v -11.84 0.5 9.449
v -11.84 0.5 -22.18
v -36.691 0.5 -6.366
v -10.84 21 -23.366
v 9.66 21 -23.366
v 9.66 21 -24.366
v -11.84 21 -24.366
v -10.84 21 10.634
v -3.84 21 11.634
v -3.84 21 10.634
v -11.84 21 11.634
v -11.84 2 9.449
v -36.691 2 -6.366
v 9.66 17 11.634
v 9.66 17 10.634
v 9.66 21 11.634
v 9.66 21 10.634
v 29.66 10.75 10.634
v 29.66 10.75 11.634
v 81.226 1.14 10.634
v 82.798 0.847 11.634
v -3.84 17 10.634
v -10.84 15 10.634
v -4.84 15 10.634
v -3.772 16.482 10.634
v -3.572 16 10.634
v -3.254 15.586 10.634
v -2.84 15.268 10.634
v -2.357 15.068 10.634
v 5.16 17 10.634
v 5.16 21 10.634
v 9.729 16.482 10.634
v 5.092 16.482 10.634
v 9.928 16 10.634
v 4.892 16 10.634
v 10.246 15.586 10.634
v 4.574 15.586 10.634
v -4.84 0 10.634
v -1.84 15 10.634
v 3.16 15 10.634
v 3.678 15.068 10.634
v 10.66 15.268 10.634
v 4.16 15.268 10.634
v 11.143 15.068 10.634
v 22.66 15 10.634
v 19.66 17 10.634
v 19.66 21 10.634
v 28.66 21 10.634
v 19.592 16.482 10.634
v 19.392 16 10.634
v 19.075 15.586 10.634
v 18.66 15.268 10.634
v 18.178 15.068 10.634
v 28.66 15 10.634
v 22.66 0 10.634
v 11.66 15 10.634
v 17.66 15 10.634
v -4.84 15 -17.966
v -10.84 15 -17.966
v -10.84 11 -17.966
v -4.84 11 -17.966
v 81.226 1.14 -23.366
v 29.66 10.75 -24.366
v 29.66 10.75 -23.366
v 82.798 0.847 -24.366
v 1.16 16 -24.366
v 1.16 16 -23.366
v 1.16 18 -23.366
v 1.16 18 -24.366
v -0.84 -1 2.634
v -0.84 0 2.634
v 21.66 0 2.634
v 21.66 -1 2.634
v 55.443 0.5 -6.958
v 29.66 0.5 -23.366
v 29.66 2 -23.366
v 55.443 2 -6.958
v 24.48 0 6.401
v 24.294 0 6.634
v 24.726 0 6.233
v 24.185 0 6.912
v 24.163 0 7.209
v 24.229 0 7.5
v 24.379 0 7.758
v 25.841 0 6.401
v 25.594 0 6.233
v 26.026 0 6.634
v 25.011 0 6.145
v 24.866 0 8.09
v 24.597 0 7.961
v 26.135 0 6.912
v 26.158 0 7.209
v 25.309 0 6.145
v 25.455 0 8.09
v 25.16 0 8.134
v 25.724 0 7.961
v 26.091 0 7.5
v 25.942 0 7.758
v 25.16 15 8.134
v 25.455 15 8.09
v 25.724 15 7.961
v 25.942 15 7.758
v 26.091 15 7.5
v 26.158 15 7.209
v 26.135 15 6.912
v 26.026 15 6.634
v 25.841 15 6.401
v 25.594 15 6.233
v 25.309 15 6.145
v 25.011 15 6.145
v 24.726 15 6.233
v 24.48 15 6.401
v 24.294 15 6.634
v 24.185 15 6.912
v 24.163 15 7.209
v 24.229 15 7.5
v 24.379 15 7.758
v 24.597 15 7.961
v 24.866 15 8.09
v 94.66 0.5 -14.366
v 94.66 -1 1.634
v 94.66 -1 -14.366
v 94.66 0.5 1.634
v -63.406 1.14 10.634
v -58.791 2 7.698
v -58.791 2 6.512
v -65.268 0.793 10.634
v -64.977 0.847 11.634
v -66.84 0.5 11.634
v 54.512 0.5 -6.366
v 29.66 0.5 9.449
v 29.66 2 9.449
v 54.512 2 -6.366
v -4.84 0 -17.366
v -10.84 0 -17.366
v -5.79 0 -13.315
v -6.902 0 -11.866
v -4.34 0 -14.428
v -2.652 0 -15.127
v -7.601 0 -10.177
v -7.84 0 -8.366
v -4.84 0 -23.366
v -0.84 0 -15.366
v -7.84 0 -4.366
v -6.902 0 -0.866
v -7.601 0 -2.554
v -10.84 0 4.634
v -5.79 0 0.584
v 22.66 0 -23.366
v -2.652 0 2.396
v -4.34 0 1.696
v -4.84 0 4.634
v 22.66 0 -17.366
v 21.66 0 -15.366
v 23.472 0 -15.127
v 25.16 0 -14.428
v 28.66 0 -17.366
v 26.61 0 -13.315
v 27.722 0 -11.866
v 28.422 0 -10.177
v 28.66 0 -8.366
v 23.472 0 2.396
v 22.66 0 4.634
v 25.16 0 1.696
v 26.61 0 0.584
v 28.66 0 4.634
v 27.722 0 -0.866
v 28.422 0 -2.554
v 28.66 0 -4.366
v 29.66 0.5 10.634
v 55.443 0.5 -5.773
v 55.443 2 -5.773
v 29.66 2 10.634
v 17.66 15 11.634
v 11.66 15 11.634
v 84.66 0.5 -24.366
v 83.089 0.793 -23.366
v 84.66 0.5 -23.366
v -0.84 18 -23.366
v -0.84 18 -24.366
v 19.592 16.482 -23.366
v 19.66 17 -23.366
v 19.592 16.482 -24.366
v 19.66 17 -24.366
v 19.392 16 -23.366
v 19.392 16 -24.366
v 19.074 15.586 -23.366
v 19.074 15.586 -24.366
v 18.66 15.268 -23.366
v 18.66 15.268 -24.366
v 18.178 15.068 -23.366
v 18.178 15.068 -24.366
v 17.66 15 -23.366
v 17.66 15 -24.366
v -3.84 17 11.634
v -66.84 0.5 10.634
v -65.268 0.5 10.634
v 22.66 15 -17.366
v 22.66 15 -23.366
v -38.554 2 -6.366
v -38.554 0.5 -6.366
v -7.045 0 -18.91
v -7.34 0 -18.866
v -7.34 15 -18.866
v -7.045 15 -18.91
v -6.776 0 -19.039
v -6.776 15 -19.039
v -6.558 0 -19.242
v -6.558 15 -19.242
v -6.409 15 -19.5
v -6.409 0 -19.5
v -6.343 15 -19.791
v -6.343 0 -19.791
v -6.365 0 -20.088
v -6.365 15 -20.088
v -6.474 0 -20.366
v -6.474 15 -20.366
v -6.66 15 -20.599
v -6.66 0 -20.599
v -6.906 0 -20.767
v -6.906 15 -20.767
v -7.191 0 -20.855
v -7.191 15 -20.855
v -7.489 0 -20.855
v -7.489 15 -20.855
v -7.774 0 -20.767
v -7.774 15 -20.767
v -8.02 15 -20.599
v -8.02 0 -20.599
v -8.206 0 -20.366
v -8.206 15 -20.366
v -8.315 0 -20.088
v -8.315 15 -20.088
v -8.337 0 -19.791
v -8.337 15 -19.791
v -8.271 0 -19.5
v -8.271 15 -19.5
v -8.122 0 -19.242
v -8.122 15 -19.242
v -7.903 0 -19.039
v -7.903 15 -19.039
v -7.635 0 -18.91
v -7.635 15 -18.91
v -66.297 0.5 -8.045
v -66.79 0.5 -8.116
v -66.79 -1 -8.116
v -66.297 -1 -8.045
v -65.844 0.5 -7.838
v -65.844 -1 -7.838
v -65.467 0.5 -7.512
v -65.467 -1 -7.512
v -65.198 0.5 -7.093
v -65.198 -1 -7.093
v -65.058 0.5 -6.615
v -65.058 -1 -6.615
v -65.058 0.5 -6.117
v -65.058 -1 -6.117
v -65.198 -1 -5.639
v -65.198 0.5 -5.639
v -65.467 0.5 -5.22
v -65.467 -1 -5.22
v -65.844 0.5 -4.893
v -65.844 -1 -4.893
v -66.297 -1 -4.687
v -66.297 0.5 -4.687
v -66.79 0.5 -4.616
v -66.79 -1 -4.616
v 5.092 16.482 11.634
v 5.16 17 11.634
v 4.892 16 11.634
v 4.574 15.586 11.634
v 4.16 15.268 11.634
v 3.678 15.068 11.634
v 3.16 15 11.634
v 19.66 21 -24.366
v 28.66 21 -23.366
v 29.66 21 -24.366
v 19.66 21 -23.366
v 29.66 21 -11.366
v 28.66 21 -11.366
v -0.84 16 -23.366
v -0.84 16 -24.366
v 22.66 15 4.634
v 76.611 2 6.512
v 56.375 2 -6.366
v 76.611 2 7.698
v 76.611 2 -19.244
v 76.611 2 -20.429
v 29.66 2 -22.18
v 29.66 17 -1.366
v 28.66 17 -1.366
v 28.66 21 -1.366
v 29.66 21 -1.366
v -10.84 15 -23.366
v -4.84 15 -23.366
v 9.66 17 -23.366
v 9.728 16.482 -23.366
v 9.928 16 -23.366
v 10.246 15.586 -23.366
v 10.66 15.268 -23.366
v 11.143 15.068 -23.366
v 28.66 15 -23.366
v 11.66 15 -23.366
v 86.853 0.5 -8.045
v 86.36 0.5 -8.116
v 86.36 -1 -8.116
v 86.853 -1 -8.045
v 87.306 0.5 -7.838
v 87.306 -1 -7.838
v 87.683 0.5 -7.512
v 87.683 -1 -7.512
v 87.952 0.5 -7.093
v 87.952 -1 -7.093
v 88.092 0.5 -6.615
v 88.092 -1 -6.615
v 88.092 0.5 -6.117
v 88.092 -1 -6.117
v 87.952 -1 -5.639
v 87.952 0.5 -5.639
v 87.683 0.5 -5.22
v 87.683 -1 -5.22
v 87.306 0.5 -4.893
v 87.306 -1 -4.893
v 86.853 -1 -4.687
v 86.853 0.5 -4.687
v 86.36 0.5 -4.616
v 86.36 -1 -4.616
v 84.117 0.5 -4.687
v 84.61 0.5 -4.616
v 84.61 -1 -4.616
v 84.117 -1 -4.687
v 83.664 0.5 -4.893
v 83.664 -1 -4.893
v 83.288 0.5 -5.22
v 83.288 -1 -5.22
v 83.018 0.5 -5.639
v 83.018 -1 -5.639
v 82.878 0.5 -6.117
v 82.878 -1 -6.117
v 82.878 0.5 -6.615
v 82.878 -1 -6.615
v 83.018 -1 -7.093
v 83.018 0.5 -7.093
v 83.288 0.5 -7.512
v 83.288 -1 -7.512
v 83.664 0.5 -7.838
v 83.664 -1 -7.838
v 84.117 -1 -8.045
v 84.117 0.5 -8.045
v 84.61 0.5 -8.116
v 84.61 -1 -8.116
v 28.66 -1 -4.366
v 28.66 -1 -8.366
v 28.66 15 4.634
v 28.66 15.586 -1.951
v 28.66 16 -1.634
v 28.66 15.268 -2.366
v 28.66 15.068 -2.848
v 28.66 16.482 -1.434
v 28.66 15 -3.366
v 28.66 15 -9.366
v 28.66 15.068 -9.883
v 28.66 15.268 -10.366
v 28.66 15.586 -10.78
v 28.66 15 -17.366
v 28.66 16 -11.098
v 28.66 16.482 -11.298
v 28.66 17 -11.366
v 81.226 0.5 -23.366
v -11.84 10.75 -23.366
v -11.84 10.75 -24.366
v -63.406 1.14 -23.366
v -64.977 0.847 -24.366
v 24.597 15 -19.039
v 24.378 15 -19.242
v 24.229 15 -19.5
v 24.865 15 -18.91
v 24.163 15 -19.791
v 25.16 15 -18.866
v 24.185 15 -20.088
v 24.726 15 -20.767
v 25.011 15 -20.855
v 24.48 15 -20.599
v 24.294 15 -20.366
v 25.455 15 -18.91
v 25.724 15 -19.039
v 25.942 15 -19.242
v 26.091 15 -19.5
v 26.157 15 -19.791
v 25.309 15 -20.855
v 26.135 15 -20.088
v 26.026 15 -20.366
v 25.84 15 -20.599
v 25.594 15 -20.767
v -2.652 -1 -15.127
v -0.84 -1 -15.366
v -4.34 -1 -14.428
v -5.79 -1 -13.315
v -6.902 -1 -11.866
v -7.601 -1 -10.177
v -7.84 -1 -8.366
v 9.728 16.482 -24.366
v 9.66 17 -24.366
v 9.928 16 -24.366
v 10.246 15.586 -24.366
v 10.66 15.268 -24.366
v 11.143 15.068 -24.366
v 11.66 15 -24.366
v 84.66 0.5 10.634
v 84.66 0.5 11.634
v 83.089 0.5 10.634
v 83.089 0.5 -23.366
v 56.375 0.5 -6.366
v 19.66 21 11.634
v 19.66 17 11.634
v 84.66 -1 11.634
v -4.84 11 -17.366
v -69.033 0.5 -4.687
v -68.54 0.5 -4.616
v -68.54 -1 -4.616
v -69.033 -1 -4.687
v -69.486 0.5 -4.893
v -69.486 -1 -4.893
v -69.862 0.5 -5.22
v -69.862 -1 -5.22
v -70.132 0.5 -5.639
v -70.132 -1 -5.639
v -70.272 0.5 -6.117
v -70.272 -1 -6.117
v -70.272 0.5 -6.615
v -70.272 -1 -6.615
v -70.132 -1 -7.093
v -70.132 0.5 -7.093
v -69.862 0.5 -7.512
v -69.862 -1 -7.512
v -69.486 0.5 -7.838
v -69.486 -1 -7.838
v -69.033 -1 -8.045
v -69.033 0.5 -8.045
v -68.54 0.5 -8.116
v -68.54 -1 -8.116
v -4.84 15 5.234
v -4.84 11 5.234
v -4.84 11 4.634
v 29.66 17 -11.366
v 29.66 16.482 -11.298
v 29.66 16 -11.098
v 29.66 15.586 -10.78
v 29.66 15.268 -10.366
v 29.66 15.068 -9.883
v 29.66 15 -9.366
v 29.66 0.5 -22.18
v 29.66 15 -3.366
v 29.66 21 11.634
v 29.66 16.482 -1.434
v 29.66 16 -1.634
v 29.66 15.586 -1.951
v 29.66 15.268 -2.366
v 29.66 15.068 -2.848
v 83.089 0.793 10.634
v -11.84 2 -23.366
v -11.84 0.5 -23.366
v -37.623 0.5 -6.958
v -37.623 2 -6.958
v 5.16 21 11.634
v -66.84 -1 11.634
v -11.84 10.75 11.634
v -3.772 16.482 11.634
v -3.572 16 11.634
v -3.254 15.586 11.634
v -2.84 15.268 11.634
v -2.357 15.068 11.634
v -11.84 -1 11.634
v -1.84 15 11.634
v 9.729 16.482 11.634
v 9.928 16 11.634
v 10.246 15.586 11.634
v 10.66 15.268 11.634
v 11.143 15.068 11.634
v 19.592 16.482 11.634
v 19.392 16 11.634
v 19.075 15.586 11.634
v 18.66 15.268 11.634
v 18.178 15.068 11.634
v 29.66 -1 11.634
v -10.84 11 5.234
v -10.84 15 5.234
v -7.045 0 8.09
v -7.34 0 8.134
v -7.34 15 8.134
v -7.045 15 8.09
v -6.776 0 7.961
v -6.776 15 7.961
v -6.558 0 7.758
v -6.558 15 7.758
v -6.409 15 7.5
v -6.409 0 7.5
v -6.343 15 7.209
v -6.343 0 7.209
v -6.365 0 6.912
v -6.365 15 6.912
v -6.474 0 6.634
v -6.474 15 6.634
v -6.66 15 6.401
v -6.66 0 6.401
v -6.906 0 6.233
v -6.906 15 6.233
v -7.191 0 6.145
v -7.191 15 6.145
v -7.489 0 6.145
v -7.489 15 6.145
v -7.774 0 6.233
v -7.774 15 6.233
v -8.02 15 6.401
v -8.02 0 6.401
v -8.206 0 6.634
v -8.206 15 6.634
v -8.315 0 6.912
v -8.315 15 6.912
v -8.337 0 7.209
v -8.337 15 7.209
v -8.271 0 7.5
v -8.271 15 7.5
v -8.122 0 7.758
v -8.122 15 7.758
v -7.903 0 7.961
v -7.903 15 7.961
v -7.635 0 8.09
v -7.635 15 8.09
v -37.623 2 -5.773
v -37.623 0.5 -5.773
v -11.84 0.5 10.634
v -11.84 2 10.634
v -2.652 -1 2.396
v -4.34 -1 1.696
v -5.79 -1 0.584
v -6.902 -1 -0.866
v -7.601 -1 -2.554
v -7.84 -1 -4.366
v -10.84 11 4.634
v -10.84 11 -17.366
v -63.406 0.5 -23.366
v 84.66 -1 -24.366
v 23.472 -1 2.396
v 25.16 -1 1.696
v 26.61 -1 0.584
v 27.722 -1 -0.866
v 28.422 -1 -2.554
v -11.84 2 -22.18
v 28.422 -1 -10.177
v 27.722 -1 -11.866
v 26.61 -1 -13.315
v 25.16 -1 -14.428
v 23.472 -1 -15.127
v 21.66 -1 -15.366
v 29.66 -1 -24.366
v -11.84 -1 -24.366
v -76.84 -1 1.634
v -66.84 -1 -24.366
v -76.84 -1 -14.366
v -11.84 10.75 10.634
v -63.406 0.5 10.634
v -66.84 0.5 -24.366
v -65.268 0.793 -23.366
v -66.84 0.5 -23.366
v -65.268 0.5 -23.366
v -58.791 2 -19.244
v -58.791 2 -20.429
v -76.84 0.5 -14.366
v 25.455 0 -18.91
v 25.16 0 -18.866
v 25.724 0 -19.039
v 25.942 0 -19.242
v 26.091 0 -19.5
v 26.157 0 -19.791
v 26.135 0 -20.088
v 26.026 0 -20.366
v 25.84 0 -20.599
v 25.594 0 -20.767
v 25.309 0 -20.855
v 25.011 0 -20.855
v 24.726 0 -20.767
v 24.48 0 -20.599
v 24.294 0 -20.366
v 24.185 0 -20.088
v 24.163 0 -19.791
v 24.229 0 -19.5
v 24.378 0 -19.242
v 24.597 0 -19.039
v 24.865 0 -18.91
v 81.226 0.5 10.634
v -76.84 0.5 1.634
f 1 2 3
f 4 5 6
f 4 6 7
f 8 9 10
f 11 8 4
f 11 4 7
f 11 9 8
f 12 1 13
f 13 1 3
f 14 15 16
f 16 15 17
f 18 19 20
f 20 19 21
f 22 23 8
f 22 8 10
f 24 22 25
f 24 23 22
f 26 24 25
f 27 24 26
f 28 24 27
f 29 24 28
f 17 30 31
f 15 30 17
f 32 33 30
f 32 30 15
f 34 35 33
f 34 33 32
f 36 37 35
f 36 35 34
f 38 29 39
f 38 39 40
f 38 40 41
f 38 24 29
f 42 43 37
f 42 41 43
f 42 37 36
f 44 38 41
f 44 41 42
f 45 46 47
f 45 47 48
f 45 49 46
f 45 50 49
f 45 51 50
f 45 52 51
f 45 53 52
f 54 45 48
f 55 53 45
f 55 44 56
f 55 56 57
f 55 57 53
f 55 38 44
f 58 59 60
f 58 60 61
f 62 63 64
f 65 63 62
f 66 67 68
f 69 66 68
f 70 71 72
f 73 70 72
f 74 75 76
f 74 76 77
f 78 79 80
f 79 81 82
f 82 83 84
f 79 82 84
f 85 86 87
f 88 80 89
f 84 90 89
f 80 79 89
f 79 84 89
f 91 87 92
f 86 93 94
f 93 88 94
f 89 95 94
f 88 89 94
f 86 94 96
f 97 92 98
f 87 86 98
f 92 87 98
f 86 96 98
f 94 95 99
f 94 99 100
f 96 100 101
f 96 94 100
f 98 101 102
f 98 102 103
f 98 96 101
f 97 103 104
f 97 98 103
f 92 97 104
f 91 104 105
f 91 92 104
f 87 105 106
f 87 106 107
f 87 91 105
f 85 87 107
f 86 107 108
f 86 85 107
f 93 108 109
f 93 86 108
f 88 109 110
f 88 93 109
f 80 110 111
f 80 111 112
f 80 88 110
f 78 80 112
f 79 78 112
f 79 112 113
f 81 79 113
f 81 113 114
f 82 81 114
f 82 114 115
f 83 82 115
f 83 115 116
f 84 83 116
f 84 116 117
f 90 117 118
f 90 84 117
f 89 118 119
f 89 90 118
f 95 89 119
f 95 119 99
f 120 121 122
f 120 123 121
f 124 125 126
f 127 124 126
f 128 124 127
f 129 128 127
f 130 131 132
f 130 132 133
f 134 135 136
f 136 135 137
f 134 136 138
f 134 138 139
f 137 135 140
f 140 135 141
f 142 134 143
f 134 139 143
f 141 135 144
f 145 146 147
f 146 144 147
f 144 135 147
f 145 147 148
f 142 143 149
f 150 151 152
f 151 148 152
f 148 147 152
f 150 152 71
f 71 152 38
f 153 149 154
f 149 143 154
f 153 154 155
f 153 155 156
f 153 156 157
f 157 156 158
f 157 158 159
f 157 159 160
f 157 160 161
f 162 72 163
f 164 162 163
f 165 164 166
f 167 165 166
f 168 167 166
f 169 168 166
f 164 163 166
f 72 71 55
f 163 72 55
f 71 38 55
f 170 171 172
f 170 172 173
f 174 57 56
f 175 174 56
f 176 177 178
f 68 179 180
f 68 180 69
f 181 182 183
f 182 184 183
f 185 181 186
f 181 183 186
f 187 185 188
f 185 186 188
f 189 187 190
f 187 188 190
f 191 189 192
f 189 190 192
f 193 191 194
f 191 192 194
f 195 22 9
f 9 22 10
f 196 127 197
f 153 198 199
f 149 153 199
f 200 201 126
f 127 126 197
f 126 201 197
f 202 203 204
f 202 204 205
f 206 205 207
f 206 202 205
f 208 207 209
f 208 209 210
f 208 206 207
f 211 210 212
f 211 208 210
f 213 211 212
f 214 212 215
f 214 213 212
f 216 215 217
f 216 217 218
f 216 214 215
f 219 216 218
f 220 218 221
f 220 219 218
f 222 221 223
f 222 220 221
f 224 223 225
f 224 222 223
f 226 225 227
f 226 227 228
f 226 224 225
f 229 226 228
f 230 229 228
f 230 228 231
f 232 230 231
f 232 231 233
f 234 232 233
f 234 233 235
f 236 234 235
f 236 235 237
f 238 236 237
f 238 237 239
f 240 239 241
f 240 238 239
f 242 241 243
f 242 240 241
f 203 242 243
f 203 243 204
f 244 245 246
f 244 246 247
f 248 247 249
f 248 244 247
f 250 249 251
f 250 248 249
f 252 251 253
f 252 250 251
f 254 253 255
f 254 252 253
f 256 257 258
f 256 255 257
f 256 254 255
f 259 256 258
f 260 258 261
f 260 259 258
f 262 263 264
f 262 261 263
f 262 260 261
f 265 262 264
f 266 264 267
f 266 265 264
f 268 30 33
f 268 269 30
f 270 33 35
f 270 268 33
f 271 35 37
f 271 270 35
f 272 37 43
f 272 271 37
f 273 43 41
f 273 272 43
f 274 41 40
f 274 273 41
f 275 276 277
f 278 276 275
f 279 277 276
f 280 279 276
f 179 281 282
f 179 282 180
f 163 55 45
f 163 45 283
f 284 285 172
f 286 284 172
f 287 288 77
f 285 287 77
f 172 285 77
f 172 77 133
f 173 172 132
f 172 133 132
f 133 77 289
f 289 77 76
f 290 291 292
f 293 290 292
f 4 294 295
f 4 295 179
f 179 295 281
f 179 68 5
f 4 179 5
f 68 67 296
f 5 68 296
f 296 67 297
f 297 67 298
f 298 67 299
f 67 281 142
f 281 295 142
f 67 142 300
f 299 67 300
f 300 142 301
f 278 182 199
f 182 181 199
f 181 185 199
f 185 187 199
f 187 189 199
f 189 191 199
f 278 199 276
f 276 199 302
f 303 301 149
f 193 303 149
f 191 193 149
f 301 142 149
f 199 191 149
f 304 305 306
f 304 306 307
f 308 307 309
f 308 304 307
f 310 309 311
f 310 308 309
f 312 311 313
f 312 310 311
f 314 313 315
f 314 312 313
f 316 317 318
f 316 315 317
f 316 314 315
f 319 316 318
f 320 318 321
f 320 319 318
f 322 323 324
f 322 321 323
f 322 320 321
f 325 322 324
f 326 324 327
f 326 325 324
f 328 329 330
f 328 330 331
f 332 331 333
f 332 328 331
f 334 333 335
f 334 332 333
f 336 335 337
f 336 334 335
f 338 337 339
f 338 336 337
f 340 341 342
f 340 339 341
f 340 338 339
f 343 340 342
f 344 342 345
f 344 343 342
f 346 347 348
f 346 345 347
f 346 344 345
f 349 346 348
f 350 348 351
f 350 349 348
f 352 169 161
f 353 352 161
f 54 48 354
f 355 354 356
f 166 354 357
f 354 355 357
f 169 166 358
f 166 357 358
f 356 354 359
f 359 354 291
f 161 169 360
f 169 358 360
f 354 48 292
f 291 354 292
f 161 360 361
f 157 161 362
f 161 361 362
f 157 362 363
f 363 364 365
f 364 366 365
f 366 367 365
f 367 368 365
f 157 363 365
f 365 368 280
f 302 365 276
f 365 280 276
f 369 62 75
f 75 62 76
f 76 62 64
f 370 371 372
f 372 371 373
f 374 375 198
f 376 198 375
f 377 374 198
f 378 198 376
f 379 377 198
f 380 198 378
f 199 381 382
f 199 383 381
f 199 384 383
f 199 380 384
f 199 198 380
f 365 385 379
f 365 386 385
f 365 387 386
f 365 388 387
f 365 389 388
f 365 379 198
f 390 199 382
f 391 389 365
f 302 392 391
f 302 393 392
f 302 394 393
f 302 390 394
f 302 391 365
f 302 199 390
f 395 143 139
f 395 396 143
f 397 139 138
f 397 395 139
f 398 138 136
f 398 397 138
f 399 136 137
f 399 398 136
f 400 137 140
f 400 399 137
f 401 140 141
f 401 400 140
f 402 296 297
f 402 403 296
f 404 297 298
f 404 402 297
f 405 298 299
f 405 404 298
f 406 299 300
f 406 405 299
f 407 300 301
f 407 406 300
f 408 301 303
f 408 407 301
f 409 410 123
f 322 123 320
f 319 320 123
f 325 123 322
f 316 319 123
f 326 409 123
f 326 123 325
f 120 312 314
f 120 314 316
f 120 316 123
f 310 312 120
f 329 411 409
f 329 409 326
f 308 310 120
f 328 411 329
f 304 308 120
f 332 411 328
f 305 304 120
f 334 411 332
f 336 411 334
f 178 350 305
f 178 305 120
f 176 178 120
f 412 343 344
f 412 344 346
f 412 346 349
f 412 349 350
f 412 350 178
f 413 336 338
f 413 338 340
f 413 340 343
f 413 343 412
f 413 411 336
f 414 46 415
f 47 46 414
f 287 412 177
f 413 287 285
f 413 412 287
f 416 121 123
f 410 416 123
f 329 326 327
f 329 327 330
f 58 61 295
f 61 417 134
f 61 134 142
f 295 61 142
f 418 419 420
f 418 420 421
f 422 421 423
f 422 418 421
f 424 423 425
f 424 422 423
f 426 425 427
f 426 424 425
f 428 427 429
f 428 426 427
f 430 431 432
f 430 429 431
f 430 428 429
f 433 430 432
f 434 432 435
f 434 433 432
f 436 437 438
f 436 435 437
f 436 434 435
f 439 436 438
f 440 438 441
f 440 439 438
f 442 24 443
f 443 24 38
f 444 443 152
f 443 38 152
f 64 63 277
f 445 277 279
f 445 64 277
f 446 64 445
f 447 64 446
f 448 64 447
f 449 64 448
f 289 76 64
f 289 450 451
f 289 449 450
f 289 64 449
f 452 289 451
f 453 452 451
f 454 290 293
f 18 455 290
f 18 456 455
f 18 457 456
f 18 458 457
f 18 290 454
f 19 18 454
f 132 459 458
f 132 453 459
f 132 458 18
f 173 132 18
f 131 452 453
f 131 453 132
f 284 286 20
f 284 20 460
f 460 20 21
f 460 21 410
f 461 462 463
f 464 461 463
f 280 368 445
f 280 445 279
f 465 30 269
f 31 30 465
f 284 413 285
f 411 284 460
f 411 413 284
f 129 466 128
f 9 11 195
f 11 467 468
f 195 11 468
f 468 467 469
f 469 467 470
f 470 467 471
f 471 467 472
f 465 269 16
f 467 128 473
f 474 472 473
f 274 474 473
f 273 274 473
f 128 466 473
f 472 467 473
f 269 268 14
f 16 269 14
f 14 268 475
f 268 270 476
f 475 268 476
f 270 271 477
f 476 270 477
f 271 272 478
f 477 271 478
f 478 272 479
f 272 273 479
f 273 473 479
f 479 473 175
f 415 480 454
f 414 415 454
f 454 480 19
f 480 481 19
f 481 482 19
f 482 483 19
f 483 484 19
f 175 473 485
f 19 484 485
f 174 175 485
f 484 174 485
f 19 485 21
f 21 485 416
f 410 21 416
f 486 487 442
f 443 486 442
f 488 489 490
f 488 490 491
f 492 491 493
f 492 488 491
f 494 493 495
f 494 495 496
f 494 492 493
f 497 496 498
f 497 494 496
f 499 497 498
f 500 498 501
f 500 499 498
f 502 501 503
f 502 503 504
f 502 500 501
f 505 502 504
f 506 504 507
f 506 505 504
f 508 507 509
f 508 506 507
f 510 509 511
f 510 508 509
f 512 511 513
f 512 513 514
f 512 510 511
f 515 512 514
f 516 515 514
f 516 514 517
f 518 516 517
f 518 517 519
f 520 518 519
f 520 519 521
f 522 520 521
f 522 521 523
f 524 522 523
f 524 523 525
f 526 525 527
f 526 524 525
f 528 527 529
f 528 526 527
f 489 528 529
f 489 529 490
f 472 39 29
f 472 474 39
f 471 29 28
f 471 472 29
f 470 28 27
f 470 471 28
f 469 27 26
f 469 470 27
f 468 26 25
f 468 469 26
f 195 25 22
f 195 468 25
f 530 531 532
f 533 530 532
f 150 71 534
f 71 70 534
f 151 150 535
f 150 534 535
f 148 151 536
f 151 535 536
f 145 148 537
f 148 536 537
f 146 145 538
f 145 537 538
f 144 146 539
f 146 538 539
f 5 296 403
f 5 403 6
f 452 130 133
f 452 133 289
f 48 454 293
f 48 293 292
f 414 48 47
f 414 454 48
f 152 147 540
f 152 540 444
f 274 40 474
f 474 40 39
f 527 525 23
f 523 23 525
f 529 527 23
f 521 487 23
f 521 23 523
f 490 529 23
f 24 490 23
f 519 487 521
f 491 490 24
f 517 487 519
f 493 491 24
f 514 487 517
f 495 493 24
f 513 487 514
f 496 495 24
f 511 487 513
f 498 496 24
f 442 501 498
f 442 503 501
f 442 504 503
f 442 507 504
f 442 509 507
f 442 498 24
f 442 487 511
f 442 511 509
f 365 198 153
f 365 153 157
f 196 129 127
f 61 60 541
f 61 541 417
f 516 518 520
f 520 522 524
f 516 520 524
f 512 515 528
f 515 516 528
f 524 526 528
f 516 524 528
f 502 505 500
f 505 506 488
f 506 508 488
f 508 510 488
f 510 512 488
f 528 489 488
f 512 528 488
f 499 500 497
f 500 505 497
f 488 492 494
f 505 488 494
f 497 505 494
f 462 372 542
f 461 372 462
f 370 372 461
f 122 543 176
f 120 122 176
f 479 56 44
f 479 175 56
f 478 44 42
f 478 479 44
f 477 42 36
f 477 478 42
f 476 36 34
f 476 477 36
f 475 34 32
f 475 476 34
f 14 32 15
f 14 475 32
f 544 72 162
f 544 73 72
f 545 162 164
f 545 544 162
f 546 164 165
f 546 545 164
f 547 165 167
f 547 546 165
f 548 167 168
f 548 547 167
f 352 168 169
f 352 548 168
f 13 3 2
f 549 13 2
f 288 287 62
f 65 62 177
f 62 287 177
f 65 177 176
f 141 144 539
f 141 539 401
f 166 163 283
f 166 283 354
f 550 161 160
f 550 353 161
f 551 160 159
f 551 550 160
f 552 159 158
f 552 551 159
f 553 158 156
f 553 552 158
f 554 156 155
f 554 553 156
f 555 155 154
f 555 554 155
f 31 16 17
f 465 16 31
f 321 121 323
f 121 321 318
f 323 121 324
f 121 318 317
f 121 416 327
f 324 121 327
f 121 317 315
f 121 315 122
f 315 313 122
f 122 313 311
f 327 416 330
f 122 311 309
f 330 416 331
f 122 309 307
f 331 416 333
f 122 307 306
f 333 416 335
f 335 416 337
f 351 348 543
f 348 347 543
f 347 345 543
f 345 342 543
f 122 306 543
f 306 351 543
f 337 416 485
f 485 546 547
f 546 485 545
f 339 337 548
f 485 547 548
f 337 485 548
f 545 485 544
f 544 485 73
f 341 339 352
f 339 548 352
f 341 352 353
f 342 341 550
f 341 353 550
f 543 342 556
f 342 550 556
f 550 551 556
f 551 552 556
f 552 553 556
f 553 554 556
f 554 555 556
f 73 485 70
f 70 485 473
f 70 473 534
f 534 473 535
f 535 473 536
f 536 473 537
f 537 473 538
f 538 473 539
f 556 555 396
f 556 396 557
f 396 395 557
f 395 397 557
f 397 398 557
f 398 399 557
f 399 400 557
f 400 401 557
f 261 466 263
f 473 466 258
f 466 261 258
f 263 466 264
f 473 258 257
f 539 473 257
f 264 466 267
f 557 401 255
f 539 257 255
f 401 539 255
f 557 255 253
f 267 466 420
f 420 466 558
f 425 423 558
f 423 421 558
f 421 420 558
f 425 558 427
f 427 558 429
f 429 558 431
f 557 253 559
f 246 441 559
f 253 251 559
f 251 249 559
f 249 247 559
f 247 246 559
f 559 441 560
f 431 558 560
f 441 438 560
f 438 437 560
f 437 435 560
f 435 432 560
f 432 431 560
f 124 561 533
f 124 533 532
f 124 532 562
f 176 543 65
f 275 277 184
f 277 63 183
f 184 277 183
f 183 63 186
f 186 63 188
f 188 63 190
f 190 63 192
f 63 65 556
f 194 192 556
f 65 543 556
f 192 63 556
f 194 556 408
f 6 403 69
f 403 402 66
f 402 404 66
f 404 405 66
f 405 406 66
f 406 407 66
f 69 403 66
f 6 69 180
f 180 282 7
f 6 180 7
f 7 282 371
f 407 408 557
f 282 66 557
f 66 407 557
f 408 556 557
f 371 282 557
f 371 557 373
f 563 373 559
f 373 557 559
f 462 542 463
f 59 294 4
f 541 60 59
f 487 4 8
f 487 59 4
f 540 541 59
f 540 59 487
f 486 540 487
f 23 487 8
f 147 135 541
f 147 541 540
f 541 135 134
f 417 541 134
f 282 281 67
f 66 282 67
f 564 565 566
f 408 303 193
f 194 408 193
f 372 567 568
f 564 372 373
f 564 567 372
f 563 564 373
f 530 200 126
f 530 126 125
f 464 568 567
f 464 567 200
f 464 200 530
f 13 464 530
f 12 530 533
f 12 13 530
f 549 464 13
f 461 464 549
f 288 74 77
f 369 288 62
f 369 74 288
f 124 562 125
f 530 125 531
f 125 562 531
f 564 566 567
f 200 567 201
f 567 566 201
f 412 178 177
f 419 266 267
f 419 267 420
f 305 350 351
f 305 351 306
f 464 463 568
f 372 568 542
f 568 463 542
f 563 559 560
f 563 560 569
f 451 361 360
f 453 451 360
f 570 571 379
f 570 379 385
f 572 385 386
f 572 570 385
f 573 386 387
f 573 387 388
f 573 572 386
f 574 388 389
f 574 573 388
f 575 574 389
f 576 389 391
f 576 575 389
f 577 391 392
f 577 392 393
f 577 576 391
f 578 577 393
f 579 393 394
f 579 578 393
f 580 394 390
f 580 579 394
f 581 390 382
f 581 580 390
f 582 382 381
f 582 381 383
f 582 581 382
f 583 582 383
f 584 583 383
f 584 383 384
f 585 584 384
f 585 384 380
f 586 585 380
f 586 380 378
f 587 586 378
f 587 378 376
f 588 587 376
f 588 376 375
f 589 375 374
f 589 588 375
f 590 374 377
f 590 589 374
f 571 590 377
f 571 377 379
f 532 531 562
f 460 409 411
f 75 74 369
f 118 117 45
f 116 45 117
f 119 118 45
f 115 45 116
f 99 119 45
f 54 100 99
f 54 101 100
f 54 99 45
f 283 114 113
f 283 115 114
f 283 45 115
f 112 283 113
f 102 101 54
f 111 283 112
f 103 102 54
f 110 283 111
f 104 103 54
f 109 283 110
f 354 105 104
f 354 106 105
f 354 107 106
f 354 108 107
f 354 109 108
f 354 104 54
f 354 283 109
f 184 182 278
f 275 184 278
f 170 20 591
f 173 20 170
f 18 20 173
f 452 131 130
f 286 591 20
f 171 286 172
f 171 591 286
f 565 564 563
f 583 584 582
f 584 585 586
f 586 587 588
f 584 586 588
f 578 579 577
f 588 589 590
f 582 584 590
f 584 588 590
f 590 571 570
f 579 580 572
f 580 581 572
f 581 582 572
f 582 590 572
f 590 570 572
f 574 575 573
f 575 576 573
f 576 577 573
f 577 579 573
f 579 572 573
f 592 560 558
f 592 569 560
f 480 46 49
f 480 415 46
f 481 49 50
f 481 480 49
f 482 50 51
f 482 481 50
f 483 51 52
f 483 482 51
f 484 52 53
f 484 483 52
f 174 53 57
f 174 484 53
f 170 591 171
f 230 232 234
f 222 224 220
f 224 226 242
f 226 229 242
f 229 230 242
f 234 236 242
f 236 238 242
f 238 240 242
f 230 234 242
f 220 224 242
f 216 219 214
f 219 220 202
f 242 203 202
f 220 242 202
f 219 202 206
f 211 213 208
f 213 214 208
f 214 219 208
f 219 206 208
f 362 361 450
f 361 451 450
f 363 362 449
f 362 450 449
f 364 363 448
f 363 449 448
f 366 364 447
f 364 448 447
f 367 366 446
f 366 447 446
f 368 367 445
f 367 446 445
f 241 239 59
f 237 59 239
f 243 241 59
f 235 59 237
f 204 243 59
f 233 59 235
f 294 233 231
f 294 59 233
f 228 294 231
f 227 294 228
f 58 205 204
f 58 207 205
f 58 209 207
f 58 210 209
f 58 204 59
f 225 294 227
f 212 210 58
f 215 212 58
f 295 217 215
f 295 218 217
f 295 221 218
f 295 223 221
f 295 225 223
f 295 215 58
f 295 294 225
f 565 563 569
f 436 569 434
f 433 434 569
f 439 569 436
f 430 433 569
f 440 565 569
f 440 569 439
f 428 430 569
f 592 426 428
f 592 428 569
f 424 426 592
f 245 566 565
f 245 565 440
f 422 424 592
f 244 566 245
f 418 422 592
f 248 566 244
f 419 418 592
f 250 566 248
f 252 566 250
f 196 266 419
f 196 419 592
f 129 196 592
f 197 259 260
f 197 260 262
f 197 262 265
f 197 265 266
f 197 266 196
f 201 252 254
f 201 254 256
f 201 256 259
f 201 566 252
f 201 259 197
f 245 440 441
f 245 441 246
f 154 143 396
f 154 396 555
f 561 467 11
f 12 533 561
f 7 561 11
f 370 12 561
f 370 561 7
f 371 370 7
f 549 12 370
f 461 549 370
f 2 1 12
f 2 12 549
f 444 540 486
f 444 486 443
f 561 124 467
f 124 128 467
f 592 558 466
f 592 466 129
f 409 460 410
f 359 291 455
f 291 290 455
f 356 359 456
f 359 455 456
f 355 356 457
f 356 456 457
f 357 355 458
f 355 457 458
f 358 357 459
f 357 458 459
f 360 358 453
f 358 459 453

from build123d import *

# Parameters (mm, degrees)
SKETCH1_W             = 6
SKETCH1_H             = 6
SKETCH1_R             = 1
BOSS_EXTRUDE1_DEPTH   = 15
BOSS_EXTRUDE1_2_DEPTH = 15
BOSS_EXTRUDE1_3_DEPTH = 15
BOSS_EXTRUDE1_4_DEPTH = 15
SKETCH2_W             = 39.5
SKETCH2_H             = 33.999999999
BOSS_EXTRUDE2_DEPTH   = 1
SKETCH3_W             = 39.5
SKETCH3_H             = 33.999999999
BOSS_EXTRUDE3_DEPTH   = 22
SKETCH4_W             = 36.5
SKETCH4_H             = 17.999999999
CUT_EXTRUDE1_DEPTH    = 22
FILLET1_R             = 7
SKETCH7_W             = 6
SKETCH7_H             = 0.6
CUT_EXTRUDE2_DEPTH    = 4
SKETCH8_W             = 9.999999999
SKETCH8_H             = 6
CUT_EXTRUDE3_DEPTH    = 4
FILLET2_R             = 2
SKETCH9_W             = 10
SKETCH9_H             = 6
SKETCH9_W_2           = 9
CUT_EXTRUDE4_DEPTH    = 4
FILLET3_R             = 2
SKETCH10_W            = 10
SKETCH10_H            = 6
CUT_EXTRUDE5_DEPTH    = 4
FILLET4_R             = 2
SKETCH11_W            = 2
SKETCH11_H            = 2
CUT_EXTRUDE6_DEPTH    = 4
SKETCH12_W            = 35.999999999
SKETCH12_H            = 1.5
BOSS_EXTRUDE4_DEPTH   = 65
SKETCH13_W            = 35.999999999
SKETCH13_H            = 1.5
BOSS_EXTRUDE5_DEPTH   = 65
CUT_EXTRUDE7_DEPTH    = 65
CHAMFER1_SIZE         = 10
BOSS_EXTRUDE6_DEPTH   = 1
BOSS_EXTRUDE7_DEPTH   = 1
BOSS_EXTRUDE8_DEPTH   = 1.5
CUT_EXTRUDE8_DEPTH    = 51.5


with BuildPart() as part:
    # Sketch1 → Boss-Extrude1 (new body)
    with BuildSketch(Plane(origin=(0, 0, 0), x_dir=(1, 0, 0), z_dir=(0, 1, 0))):
        with Locations((-7.839776389, 20.365683815)):
            Rectangle(SKETCH1_W, SKETCH1_H)
        with Locations(Location((-7.339776389, 19.865683815, 0), (0, 0, 270))):
            Circle(SKETCH1_R, mode=Mode.SUBTRACT)
    extrude(amount=BOSS_EXTRUDE1_DEPTH)



with BuildPart() as body_2:
    # Sketch1 → Boss-Extrude1 2 (new body)
    with BuildSketch(Plane(origin=(0, 0, 0), x_dir=(1, 0, 0), z_dir=(0, 1, 0))):
        with Locations((25.660223611, 20.365683814)):
            Rectangle(SKETCH1_W, SKETCH1_H)
        with Locations(Location((25.160223611, 19.865683814, 0), (0, 0, 270))):
            Circle(SKETCH1_R, mode=Mode.SUBTRACT)
    extrude(amount=BOSS_EXTRUDE1_2_DEPTH)


with BuildPart() as body_3:
    # Sketch1 → Boss-Extrude1 3 (new body)
    with BuildSketch(Plane(origin=(0, 0, 0), x_dir=(1, 0, 0), z_dir=(0, 1, 0))):
        with Locations((-7.839776389, -7.634316185)):
            Rectangle(SKETCH1_W, SKETCH1_H)
        with Locations(Location((-7.339776389, -7.134316185, 0), (0, 0, 270))):
            Circle(SKETCH1_R, mode=Mode.SUBTRACT)
    extrude(amount=BOSS_EXTRUDE1_3_DEPTH)


with BuildPart() as body_4:
    # Sketch1 → Boss-Extrude1 4 (new body)
    with BuildSketch(Plane(origin=(0, 0, 0), x_dir=(1, 0, 0), z_dir=(0, 1, 0))):
        with Locations((25.660371549, -7.634316185)):
            Rectangle(SKETCH1_W, SKETCH1_H)
        with Locations(Location((25.160371549, -7.134316185, 0), (0, 0, 270))):
            Circle(SKETCH1_R, mode=Mode.SUBTRACT)
    extrude(amount=BOSS_EXTRUDE1_4_DEPTH)


with BuildPart() as part_1:
    add(part.part)

    add(body_2.part)  # Boss-Extrude2 merges body 2

    add(body_3.part)  # Boss-Extrude2 merges body 3

    add(body_4.part)  # Boss-Extrude2 merges body 4
    # Sketch2 → Boss-Extrude2 (add)
    with BuildSketch(Plane.XZ):
        with Locations((8.910223611, -6.365683814)):
            Rectangle(SKETCH2_W, SKETCH2_H)
    extrude(amount=BOSS_EXTRUDE2_DEPTH)

    # Sketch3 → Boss-Extrude3 (add)
    with BuildSketch(Plane.XZ.offset(1)):
        Polygon((-11.839776389, 9.730248223), (-11.839776389, 11.634316185), (29.660223611, 11.634316185), (29.660223611, 9.730248223), (29.660223611, -24.365683814), (28.803720569, -24.365683814), (-10.696279431, -24.365683814), (-11.839776389, -24.365683814), align=None)
        with Locations((8.910223611, -6.365683814)):
            Rectangle(SKETCH3_W, SKETCH3_H, mode=Mode.SUBTRACT)
    extrude(amount=-BOSS_EXTRUDE3_DEPTH)

    # Sketch4 → Cut-Extrude1 (cut)
    with BuildSketch(Plane(origin=(0, 0, 0), x_dir=(1, 0, 0), z_dir=(0, 1, 0))):
        with Locations((10.410223611, 6.365683815)):
            Rectangle(SKETCH4_W, SKETCH4_H)
    extrude(amount=-CUT_EXTRUDE1_DEPTH, mode=Mode.SUBTRACT)

    # Fillet1
    fillet1_edges = [part_1.edges().sort_by_distance(p)[0] for p in [
        (-7.839776389, -0.5, 2.634316185),
        (-7.839776389, -0.5, -15.365683814),
        (28.660223611, -0.5, -15.365683814),
        (28.660223611, -0.5, 2.634316185),
    ]]
    fillet(fillet1_edges, radius=FILLET1_R)

    # Sketch7 → Cut-Extrude2 (cut)
    with BuildSketch(Plane(origin=(0, 15, 0), x_dir=(1, 0, 0), z_dir=(0, 1, 0))):
        with Locations((-7.839776389, 17.665683815)):
            Rectangle(SKETCH7_W, SKETCH7_H)
        with Locations((-7.839776389, -4.934316185)):
            Rectangle(SKETCH7_W, SKETCH7_H)
    extrude(amount=-CUT_EXTRUDE2_DEPTH, mode=Mode.SUBTRACT)

    # Sketch8 → Cut-Extrude3 (cut)
    with BuildSketch(Plane.ZY.offset(-28.660223611)):
        with Locations((-6.365683815, 18)):
            Rectangle(SKETCH8_W, SKETCH8_H)
    extrude(amount=-CUT_EXTRUDE3_DEPTH, mode=Mode.SUBTRACT)

    # Fillet2
    fillet2_edges = [part_1.edges().sort_by_distance(p)[0] for p in [
        (29.160223611, 15, -11.365683814),
        (29.160223611, 15, -1.365683815),
    ]]
    fillet(fillet2_edges, radius=FILLET2_R)

    # Sketch9 → Cut-Extrude4 (cut)
    with BuildSketch(Plane(origin=(0, 0, 10.634316185), x_dir=(-1, 0, 0), z_dir=(0, 0, -1))):
        with Locations((-14.660371549, 18)):
            Rectangle(SKETCH9_W, SKETCH9_H)
        with Locations((-0.660223611, 18)):
            Rectangle(SKETCH9_W_2, SKETCH9_H)
    extrude(amount=-CUT_EXTRUDE4_DEPTH, mode=Mode.SUBTRACT)

    # Fillet3
    fillet3_edges = [part_1.edges().sort_by_distance(p)[0] for p in [
        (19.660371549, 15, 11.134316185),
        (9.660371549, 15, 11.134316185),
        (5.160223611, 15, 11.134316185),
        (-3.839776389, 15, 11.134316185),
    ]]
    fillet(fillet3_edges, radius=FILLET3_R)

    # Sketch10 → Cut-Extrude5 (cut)
    with BuildSketch(Plane.XY.offset(-23.365683814)):
        with Locations((14.660223611, 18)):
            Rectangle(SKETCH10_W, SKETCH10_H)
    extrude(amount=-CUT_EXTRUDE5_DEPTH, mode=Mode.SUBTRACT)

    # Fillet4
    fillet4_edges = [part_1.edges().sort_by_distance(p)[0] for p in [
        (19.660223611, 15, -23.865683814),
        (9.660223611, 15, -23.865683814),
    ]]
    fillet(fillet4_edges, radius=FILLET4_R)

    # Sketch11 → Cut-Extrude6 (cut)
    with BuildSketch(Plane.XY.offset(-23.365683814)):
        with Locations((0.160223611, 17)):
            Rectangle(SKETCH11_W, SKETCH11_H)
    extrude(amount=-CUT_EXTRUDE6_DEPTH, mode=Mode.SUBTRACT)

    # Sketch12 → Boss-Extrude4 (add)
    with BuildSketch(Plane.ZY.offset(11.839776389)):
        with Locations((-6.365683814, -0.25)):
            Rectangle(SKETCH12_W, SKETCH12_H)
    extrude(amount=BOSS_EXTRUDE4_DEPTH)

    # Sketch13 → Boss-Extrude5 (add)
    with BuildSketch(Plane(origin=(29.660223611, 0, 0), x_dir=(0, 0, -1), z_dir=(1, 0, 0))):
        with Locations((6.365683814, -0.25)):
            Rectangle(SKETCH13_W, SKETCH13_H)
    extrude(amount=BOSS_EXTRUDE5_DEPTH)

    # Sketch14 → Cut-Extrude7 (cut)
    with BuildSketch(Plane(origin=(0, 0.5, 0), x_dir=(1, 0, 0), z_dir=(0, 1, 0))):
        with BuildLine():
            Line((-68.539776389, 8.115683814), (-66.789776389, 8.115683814))
            ThreePointArc((-66.789776389, 8.115683814), (-65.039776389, 6.365683814), (-66.789776389, 4.615683814))
            Line((-66.789776389, 4.615683814), (-68.539776389, 4.615683814))
            ThreePointArc((-68.539776389, 4.615683814), (-70.289776389, 6.365683814), (-68.539776389, 8.115683814))
        make_face()
        with BuildLine():
            Line((84.610223611, 8.115683814), (86.360223611, 8.115683814))
            ThreePointArc((86.360223611, 8.115683814), (88.110223611, 6.365683814), (86.360223611, 4.615683814))
            Line((86.360223611, 4.615683814), (84.610223611, 4.615683814))
            ThreePointArc((84.610223611, 4.615683814), (82.860223611, 6.365683814), (84.610223611, 8.115683814))
        make_face()
    extrude(amount=-CUT_EXTRUDE7_DEPTH, mode=Mode.SUBTRACT)

    # Chamfer1
    chamfer1_edges = [part_1.edges().sort_by_distance(p)[0] for p in [
        (-76.839776389, -0.25, -24.365683814),
        (-76.839776389, -0.25, 11.634316185),
        (94.660223611, -0.25, 11.634316185),
        (94.660223611, -0.25, -24.365683814),
    ]]
    chamfer(chamfer1_edges, length=CHAMFER1_SIZE)

    # Sketch15 → Boss-Extrude6 (add)
    with BuildSketch(Plane.XY.offset(11.634316185)):
        Polygon((-66.839776389, 0.5), (-11.839776389, 10.75), (-11.839776389, 0.5), align=None)
        Polygon((29.660223611, 10.75), (84.660223611, 0.5), (29.660223611, 0.5), align=None)
    extrude(amount=-BOSS_EXTRUDE6_DEPTH)

    # Sketch16 → Boss-Extrude7 (add)
    with BuildSketch(Plane(origin=(0, 0, -24.365683814), x_dir=(-1, 0, 0), z_dir=(0, 0, -1))):
        Polygon((-29.660223611, 10.75), (-84.660223611, 0.5), (-29.660223611, 0.5), align=None)
        Polygon((11.839776389, 10.75), (66.839776389, 0.5), (11.839776389, 0.5), align=None)
    extrude(amount=-BOSS_EXTRUDE7_DEPTH)

    # Sketch17 → Boss-Extrude8 (add)
    with BuildSketch(Plane(origin=(0, 0.5, 0), x_dir=(1, 0, 0), z_dir=(0, 1, 0))):
        Polygon((-11.839776389, 23.365683814), (-37.622747474, 6.958338579), (-64.97714713, 24.365683814), (-66.839776389, 24.365683814), (-38.554062103, 6.365683814), (-66.839776389, -11.634316185), (-64.97714713, -11.634316185), (-37.622747474, 5.77302905), (-11.839776389, -10.634316185), (-11.839776389, -9.449006657), (-36.691432844, 6.365683814), (-11.839776389, 22.180374286), align=None)
        Polygon((29.660223611, 23.365683814), (55.443194696, 6.958338579), (82.797594352, 24.365683814), (84.660223611, 24.365683814), (56.374509325, 6.365683814), (84.660223611, -11.634316185), (82.797594352, -11.634316185), (55.443194696, 5.77302905), (29.660223611, -10.634316185), (29.660223611, -9.449006657), (54.511880067, 6.365683814), (29.660223611, 22.180374286), align=None)
    extrude(amount=BOSS_EXTRUDE8_DEPTH)

    # Sketch18 → Cut-Extrude8 (cut)
    with BuildSketch(Plane.XY.offset(11.634316185)):
        Polygon((-57.576355355, 2.226364829), (-66.839776389, 0.5), (-66.839776389, 4.287768192), align=None)
        Polygon((75.79220332, 2.152676509), (84.660223611, 0.5), (84.660223611, 4.287768192), align=None)
    extrude(amount=-CUT_EXTRUDE8_DEPTH, mode=Mode.SUBTRACT)


solid = part_1.part
